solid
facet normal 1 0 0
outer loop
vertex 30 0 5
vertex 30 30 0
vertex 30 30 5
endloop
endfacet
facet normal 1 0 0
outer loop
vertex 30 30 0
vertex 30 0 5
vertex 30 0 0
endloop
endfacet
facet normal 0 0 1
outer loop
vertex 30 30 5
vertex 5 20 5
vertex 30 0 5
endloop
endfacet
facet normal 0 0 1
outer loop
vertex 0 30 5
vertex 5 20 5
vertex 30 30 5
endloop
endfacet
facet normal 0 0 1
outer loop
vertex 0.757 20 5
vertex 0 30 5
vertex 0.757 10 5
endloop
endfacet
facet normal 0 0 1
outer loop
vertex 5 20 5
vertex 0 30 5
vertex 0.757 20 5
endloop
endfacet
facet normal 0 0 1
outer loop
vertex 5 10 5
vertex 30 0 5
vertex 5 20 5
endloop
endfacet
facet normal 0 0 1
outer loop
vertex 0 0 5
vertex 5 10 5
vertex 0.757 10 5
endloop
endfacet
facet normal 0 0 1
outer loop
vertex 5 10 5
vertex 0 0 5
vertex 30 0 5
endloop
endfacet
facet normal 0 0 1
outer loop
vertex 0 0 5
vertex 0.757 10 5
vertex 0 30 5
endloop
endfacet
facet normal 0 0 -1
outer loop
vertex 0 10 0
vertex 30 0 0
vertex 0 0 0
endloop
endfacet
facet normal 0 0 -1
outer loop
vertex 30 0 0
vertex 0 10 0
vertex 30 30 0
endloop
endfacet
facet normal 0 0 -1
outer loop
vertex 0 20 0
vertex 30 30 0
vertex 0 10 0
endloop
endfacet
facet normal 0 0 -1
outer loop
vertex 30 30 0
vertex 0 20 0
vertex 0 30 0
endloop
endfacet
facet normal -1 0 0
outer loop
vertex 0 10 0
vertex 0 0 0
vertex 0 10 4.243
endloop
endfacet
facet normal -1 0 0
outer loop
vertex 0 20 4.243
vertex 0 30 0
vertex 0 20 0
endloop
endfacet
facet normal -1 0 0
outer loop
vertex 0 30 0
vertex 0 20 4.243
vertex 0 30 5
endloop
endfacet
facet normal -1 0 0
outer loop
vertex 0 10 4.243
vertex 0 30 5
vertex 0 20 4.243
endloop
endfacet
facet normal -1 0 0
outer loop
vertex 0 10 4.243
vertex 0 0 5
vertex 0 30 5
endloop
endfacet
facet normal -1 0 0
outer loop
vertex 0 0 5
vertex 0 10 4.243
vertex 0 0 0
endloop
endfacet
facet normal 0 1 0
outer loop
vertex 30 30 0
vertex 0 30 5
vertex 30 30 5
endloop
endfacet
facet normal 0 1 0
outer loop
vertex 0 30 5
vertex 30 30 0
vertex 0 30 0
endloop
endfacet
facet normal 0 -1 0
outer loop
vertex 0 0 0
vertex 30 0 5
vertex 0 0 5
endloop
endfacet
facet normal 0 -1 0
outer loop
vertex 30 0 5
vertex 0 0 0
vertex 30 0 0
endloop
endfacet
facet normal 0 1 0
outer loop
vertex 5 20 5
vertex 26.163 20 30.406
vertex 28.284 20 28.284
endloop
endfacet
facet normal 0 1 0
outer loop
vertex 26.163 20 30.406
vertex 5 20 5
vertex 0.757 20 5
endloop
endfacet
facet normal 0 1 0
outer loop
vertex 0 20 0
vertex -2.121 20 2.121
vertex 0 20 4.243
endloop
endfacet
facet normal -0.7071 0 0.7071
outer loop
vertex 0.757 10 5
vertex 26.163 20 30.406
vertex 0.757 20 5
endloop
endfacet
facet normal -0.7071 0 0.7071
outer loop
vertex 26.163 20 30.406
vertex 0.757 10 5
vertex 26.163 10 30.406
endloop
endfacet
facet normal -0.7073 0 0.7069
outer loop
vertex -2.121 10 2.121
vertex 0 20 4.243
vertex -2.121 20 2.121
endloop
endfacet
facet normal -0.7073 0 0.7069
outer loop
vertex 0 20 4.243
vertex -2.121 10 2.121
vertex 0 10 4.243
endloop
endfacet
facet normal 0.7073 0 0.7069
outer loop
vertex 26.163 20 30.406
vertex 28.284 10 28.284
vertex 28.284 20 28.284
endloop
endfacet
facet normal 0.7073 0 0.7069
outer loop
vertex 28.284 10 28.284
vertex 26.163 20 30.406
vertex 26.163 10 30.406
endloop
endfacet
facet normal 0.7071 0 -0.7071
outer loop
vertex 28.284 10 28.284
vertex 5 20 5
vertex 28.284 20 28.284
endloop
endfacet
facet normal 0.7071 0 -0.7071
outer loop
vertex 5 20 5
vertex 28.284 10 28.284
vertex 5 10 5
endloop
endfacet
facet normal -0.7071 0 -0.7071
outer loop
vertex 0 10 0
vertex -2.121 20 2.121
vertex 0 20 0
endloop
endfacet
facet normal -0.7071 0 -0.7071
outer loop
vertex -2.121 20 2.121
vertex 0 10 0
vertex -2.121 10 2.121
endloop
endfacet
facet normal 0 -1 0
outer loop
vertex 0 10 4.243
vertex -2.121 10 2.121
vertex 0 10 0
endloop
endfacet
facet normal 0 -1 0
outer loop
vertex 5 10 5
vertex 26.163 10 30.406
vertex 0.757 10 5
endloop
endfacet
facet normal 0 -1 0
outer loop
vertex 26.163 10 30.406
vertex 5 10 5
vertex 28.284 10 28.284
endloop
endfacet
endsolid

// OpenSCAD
union() {
	union() {
		cube(size = [30, 30, 5]);
		translate(v = [0, 10, 0]) {
			rotate(a = -45, v = [0, 1, 0]) {
				cube(size = [40, 10, 3]);
			}
		}
	}
}
